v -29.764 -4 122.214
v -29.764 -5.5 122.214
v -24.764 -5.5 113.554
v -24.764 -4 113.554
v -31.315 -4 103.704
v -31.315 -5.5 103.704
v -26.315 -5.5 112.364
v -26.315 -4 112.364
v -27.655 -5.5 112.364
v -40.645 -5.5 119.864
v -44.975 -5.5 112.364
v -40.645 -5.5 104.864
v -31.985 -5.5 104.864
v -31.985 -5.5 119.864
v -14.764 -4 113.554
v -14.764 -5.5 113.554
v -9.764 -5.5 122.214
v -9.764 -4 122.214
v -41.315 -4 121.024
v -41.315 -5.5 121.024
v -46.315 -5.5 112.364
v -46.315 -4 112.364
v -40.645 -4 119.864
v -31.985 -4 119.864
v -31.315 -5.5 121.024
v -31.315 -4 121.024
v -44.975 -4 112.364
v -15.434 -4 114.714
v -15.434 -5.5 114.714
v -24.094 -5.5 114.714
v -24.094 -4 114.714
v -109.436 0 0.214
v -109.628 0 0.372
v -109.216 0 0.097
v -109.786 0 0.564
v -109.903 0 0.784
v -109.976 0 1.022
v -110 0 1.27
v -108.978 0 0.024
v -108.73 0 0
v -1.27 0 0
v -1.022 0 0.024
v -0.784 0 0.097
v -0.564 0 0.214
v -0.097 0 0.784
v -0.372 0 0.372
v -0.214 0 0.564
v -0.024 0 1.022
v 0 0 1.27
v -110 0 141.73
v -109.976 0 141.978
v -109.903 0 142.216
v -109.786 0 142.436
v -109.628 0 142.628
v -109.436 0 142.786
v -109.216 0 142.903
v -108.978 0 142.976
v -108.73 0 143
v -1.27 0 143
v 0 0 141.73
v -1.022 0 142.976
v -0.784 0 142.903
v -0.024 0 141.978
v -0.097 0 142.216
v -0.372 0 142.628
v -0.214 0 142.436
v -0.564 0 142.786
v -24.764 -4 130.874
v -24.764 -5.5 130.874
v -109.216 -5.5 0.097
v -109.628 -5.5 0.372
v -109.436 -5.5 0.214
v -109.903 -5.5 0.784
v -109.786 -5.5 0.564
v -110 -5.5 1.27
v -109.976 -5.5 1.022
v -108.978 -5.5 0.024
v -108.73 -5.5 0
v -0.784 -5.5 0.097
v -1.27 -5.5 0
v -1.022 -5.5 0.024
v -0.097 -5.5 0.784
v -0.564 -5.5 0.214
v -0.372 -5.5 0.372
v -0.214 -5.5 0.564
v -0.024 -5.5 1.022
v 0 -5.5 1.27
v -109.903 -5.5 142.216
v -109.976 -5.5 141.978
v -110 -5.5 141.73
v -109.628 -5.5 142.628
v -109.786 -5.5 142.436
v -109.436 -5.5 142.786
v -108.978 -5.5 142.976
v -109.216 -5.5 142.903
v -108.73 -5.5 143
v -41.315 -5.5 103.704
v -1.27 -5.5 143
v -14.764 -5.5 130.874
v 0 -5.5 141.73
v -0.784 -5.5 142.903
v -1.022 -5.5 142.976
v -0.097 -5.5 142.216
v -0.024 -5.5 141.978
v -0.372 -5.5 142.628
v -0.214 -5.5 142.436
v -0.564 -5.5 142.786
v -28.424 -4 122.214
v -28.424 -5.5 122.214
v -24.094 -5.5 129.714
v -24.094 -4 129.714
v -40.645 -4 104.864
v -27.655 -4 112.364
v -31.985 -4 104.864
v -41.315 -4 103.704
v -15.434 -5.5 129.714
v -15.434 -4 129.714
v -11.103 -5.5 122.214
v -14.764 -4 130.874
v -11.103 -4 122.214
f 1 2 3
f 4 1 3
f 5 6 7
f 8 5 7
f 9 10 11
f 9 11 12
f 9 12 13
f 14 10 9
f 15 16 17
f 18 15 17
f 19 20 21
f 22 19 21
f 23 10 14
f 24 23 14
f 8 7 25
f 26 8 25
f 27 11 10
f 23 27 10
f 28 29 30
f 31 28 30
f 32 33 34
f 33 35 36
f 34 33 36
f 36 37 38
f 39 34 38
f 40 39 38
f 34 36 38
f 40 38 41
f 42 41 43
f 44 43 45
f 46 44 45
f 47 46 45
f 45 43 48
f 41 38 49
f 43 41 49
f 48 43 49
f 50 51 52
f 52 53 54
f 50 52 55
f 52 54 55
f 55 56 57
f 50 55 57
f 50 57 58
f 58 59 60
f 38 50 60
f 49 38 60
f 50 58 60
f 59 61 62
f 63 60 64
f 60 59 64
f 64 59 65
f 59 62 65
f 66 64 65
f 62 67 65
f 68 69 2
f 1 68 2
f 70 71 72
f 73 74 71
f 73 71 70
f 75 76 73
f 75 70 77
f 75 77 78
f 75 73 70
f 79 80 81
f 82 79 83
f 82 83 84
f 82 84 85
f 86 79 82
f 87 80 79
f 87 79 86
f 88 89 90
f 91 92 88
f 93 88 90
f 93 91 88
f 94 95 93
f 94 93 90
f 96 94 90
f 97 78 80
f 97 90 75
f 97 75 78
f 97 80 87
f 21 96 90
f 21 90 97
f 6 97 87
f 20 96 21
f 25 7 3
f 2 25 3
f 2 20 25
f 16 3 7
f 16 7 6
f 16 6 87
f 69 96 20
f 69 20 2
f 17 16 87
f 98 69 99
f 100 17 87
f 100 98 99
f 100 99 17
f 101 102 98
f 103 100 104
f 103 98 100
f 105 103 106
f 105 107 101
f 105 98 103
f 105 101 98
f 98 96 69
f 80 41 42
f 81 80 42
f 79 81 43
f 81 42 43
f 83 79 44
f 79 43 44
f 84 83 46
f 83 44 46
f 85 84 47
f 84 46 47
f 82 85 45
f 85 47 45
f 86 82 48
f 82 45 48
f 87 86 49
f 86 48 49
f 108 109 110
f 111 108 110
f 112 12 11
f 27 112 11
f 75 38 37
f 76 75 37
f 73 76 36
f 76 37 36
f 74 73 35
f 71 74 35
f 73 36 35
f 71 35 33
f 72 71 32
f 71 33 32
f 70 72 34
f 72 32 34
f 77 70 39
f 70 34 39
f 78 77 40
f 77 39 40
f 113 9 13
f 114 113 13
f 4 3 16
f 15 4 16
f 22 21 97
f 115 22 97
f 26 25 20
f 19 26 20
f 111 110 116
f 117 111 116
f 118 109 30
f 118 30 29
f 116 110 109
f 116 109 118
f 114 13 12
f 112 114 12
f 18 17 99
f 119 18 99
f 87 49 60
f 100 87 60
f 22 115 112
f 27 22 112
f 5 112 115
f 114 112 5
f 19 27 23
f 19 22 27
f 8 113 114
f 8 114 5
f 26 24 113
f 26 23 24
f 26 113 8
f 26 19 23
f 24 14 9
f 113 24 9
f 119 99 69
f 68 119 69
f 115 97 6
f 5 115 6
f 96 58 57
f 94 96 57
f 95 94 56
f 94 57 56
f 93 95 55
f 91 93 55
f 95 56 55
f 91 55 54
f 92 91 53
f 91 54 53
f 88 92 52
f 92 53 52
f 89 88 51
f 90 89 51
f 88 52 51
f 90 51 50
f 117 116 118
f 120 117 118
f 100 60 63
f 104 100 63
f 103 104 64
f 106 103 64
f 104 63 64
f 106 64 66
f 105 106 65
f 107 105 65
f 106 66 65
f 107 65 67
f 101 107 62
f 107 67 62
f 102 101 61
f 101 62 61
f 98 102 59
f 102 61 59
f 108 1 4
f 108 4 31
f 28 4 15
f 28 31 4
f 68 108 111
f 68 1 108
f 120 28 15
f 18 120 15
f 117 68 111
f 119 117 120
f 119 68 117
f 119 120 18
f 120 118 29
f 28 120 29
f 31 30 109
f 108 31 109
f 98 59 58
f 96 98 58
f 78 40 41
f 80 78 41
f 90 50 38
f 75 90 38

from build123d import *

# Parameters (mm, degrees)
F1_DEPTH = 5.5
F3_DEPTH = 1.5


with BuildPart() as f1:
    # F0 (on Front) → F1 (new body)
    with BuildSketch(Plane.XZ):
        with BuildLine():
            Line((-108.73, 0), (-1.27, 0))
            ThreePointArc((-1.27, 0), (-0.371974, 0.371974), (0, 1.27))
            Line((0, 1.27), (0, 141.73))
            ThreePointArc((0, 141.73), (-0.371974, 142.628026), (-1.27, 143))
            Line((-1.27, 143), (-108.73, 143))
            ThreePointArc((-108.73, 143), (-109.628026, 142.628026), (-110, 141.73))
            Line((-110, 141.73), (-110, 1.27))
            ThreePointArc((-110, 1.27), (-109.628026, 0.371974), (-108.73, 0))
        make_face()
    extrude(amount=F1_DEPTH)

    # F2 (on face) → F3 (cut)
    with BuildSketch(Plane.XZ.offset(5.5)):
        Polygon((-24.763699, 113.553825), (-14.763699, 113.553825), (-9.763699, 122.214079), (-14.763699, 130.874333), (-24.763699, 130.874333), (-29.763699, 122.214079), align=None)
        Polygon((-11.103445, 122.214079), (-15.433572, 114.714079), (-24.093826, 114.714079), (-28.423953, 122.214079), (-24.093826, 129.714079), (-15.433572, 129.714079), align=None, mode=Mode.SUBTRACT)
        Polygon((-41.31521, 121.024189), (-46.31521, 112.363935), (-41.31521, 103.70368), (-31.31521, 103.70368), (-26.31521, 112.363935), (-31.31521, 121.024189), align=None)
        Polygon((-27.654956, 112.363935), (-31.985083, 104.863935), (-40.645337, 104.863935), (-44.975464, 112.363935), (-40.645337, 119.863935), (-31.985083, 119.863935), align=None, mode=Mode.SUBTRACT)
    extrude(amount=-F3_DEPTH, mode=Mode.SUBTRACT)


solid = f1.part
